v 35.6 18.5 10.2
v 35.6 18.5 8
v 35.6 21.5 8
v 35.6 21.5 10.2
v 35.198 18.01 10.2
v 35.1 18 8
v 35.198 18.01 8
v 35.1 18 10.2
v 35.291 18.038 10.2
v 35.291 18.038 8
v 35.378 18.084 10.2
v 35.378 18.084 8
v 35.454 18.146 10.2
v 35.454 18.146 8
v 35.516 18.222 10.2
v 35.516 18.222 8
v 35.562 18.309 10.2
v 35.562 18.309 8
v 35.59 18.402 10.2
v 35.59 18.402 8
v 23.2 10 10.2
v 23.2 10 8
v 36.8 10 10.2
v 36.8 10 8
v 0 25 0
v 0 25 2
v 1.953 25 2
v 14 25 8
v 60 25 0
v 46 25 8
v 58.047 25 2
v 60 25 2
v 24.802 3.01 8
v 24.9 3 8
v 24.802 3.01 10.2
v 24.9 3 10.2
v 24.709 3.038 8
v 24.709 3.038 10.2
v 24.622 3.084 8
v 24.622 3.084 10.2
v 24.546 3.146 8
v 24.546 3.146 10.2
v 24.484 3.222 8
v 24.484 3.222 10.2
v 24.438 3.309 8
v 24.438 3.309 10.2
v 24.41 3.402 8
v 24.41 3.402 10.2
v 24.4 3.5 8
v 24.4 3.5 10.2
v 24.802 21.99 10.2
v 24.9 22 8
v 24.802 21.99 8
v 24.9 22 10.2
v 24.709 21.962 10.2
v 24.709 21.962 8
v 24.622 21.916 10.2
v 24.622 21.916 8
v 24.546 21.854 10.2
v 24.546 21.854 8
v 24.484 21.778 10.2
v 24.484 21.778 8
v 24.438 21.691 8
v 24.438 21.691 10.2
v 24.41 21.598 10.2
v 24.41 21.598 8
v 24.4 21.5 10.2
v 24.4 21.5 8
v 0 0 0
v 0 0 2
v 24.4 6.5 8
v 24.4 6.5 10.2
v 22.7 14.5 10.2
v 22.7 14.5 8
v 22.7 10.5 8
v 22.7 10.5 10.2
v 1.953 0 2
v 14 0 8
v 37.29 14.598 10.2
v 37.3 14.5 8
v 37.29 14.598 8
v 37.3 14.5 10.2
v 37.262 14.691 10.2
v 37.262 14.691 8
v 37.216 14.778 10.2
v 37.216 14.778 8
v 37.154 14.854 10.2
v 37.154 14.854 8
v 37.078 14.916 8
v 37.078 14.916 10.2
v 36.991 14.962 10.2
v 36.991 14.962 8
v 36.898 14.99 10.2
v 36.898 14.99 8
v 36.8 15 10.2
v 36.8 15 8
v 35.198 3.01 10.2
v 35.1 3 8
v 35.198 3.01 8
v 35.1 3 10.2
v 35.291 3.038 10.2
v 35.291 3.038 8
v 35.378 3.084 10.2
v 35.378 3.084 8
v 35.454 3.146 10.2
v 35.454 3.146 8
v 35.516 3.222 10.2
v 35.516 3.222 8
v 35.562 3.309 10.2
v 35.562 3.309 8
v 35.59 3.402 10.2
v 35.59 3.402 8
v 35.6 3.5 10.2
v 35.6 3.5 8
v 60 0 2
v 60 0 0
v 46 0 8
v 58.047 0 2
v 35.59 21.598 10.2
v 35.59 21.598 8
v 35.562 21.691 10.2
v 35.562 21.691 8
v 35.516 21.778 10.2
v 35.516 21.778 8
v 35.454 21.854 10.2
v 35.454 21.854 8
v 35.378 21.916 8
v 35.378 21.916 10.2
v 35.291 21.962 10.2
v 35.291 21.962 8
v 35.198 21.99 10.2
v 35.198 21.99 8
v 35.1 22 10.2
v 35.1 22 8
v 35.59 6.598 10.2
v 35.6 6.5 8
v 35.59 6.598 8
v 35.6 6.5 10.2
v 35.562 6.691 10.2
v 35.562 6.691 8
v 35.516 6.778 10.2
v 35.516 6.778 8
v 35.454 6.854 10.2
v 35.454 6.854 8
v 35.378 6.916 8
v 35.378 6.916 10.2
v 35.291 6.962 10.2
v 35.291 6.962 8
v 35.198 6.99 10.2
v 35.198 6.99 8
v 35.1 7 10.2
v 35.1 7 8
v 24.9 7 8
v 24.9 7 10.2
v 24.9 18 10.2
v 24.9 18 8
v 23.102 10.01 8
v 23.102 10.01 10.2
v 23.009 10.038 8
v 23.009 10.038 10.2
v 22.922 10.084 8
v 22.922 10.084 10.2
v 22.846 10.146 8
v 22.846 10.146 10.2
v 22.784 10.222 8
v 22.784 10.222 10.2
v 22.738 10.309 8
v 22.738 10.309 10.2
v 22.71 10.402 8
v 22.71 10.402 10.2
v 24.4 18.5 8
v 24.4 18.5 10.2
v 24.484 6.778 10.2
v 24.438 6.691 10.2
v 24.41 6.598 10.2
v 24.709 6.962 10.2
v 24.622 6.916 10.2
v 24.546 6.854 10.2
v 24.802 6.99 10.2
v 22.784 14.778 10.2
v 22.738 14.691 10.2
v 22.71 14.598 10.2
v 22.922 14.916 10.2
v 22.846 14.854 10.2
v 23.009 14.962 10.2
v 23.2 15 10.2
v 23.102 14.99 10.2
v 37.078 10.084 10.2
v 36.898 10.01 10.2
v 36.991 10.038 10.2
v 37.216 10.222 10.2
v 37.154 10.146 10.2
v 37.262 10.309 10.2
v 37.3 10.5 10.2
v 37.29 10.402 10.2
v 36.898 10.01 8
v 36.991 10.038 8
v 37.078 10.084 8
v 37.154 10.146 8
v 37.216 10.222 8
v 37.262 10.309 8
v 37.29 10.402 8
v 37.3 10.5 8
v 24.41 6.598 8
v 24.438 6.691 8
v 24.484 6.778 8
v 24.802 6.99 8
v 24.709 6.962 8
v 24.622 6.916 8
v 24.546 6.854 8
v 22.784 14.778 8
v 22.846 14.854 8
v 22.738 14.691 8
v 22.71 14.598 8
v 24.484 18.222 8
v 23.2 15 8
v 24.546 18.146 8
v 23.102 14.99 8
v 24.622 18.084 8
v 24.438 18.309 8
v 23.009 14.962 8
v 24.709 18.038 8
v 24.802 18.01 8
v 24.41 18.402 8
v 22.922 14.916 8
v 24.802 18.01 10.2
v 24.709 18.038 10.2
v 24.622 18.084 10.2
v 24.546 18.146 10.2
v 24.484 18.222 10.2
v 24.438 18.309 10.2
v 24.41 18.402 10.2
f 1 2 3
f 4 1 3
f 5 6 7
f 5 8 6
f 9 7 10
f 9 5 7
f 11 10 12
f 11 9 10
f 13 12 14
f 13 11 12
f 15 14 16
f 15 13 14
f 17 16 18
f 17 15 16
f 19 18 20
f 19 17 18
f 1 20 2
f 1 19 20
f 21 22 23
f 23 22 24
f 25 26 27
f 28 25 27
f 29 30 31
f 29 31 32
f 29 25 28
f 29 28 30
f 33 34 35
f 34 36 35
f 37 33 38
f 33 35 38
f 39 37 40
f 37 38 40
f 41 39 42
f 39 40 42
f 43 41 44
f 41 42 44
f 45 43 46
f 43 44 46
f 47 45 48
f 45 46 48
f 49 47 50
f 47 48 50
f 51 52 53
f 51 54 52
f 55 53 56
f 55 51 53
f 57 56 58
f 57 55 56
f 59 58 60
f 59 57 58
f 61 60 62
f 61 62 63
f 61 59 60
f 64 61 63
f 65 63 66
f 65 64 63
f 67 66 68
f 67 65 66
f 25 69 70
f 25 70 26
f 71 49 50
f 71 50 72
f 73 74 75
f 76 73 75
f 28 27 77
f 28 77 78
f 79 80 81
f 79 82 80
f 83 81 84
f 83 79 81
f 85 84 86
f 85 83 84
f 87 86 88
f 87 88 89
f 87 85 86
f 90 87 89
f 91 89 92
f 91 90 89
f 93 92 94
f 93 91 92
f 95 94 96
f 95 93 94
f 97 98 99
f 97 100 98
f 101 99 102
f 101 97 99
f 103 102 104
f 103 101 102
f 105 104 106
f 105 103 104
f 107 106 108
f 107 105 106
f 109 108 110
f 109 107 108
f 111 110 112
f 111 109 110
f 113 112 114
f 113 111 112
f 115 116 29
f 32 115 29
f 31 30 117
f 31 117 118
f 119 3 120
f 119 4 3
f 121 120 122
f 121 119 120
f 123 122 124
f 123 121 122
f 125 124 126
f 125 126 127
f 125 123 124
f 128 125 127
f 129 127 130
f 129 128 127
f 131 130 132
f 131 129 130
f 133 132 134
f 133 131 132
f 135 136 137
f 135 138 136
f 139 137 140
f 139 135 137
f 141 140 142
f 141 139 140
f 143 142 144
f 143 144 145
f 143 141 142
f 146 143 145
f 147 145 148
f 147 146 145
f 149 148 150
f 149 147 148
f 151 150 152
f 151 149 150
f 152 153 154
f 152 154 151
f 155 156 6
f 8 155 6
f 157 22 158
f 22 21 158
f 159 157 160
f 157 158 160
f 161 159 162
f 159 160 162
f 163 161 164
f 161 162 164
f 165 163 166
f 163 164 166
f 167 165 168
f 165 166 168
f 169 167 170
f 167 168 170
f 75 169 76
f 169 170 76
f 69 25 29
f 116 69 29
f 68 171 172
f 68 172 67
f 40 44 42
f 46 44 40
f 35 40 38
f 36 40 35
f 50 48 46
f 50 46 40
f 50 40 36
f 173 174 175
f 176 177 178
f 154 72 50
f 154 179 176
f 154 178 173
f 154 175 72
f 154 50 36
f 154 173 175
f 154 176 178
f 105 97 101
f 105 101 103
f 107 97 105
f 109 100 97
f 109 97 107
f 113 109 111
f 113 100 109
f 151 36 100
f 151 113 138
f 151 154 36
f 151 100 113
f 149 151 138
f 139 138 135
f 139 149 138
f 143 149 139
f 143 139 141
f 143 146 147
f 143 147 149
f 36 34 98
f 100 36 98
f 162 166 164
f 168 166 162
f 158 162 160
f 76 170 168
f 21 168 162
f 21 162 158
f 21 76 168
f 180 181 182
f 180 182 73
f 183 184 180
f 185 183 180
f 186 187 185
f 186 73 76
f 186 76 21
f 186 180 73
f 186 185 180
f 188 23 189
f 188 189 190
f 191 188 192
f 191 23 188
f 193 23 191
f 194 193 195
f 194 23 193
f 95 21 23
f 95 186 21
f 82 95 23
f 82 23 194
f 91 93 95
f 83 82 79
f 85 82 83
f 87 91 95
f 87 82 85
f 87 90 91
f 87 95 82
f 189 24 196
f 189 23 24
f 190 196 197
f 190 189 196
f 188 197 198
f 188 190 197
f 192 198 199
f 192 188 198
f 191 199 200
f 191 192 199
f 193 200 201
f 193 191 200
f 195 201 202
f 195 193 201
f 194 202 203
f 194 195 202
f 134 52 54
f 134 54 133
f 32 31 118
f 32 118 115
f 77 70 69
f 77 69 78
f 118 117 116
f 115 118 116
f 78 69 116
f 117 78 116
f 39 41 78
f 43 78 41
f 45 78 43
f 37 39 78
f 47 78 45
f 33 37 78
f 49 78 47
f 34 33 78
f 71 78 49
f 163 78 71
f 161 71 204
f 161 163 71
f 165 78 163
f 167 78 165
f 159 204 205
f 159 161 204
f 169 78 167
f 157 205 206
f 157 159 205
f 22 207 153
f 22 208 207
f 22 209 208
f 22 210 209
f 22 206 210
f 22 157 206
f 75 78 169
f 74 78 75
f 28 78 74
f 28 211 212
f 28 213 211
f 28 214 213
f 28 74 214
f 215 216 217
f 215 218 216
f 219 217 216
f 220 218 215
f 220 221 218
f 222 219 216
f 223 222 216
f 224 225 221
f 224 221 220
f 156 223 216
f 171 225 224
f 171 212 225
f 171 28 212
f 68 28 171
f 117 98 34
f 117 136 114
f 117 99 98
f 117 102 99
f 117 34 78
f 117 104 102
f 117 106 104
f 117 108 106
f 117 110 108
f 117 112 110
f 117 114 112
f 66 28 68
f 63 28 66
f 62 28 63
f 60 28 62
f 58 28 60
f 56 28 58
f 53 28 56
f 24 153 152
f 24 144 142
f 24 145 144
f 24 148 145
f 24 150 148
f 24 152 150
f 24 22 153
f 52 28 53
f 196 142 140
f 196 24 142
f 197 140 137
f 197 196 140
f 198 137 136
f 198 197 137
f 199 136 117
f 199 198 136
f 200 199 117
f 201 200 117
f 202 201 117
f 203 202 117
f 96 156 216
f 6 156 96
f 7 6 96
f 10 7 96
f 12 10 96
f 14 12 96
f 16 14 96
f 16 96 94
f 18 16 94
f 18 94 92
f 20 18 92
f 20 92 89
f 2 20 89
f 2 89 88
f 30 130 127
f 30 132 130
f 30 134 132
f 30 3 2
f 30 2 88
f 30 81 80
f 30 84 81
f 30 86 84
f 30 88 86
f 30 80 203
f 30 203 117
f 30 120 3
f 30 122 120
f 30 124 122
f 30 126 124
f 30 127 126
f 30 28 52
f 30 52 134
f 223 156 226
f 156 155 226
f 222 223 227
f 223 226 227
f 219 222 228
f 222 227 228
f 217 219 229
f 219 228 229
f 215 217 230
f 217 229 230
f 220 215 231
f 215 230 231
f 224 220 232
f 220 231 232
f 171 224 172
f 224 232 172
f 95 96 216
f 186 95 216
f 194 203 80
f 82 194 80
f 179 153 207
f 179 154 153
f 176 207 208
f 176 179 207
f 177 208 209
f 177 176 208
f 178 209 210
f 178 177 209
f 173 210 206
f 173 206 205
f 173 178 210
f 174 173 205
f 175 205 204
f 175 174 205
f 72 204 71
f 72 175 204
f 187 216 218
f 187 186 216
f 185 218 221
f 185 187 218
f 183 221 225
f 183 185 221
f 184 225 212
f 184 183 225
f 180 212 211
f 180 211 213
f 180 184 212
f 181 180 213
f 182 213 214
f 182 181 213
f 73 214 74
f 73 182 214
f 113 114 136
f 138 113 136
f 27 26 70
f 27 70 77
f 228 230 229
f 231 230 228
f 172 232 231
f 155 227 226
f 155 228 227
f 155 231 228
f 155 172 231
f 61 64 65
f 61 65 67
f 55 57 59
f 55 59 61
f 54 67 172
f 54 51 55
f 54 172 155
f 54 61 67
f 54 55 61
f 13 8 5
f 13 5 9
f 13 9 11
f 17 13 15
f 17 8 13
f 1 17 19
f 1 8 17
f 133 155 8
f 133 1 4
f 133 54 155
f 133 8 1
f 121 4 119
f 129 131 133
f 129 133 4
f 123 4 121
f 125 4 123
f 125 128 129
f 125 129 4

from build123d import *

# Parameters (mm, degrees)
F0_W     = 60
F0_H     = 25
F1_DEPTH = 2
F3_DEPTH = 25
F4_W     = 11.2
F4_H     = 4
F5_DEPTH = 2.2
F6_R     = 0.5


with BuildPart() as f1:
    # F0 (on Top) → F1 (new body)
    with BuildSketch(Plane.XY):
        with Locations((30, 12.5)):
            Rectangle(F0_W, F0_H)
    extrude(amount=F1_DEPTH)

    # F2 (on face) → F3 (join, through all)
    with BuildSketch(Plane(origin=(0, 25, 0), x_dir=(-1, 0, 0), z_dir=(0, 1, 0))):
        Polygon((-1.9529488989, 2), (-14, 8), (-46, 8), (-58.0470511011, 2), align=None)
    extrude(amount=-F3_DEPTH)

    # F4 (on face) → F5 (join)
    with BuildSketch(Plane.XY.offset(8)):
        with Locations((30, 5)):
            Rectangle(F4_W, F4_H)
        Polygon((22.7, 13.0000000004), (22.7, 11.9999999996), (22.7, 10), (37.3, 10), (37.3, 12.5), (37.3, 15), (22.7, 15), align=None)
        with Locations((30, 20)):
            Rectangle(F4_W, F4_H)
    extrude(amount=F5_DEPTH)

    # F6
    f6_edges = [f1.edges().sort_by_distance(p)[0] for p in [
        (24.4, 18, 9.1),
        (35.6, 18, 9.1),
        (22.7, 10, 9.1),
        (24.4, 3, 9.1),
        (35.6, 3, 9.1),
        (22.7, 15, 9.1),
        (35.6, 7, 9.1),
        (24.4, 7, 9.1),
        (24.4, 22, 9.1),
        (35.6, 22, 9.1),
        (37.3, 10, 9.1),
        (37.3, 15, 9.1),
    ]]
    fillet(f6_edges, radius=F6_R)


solid = f1.part
